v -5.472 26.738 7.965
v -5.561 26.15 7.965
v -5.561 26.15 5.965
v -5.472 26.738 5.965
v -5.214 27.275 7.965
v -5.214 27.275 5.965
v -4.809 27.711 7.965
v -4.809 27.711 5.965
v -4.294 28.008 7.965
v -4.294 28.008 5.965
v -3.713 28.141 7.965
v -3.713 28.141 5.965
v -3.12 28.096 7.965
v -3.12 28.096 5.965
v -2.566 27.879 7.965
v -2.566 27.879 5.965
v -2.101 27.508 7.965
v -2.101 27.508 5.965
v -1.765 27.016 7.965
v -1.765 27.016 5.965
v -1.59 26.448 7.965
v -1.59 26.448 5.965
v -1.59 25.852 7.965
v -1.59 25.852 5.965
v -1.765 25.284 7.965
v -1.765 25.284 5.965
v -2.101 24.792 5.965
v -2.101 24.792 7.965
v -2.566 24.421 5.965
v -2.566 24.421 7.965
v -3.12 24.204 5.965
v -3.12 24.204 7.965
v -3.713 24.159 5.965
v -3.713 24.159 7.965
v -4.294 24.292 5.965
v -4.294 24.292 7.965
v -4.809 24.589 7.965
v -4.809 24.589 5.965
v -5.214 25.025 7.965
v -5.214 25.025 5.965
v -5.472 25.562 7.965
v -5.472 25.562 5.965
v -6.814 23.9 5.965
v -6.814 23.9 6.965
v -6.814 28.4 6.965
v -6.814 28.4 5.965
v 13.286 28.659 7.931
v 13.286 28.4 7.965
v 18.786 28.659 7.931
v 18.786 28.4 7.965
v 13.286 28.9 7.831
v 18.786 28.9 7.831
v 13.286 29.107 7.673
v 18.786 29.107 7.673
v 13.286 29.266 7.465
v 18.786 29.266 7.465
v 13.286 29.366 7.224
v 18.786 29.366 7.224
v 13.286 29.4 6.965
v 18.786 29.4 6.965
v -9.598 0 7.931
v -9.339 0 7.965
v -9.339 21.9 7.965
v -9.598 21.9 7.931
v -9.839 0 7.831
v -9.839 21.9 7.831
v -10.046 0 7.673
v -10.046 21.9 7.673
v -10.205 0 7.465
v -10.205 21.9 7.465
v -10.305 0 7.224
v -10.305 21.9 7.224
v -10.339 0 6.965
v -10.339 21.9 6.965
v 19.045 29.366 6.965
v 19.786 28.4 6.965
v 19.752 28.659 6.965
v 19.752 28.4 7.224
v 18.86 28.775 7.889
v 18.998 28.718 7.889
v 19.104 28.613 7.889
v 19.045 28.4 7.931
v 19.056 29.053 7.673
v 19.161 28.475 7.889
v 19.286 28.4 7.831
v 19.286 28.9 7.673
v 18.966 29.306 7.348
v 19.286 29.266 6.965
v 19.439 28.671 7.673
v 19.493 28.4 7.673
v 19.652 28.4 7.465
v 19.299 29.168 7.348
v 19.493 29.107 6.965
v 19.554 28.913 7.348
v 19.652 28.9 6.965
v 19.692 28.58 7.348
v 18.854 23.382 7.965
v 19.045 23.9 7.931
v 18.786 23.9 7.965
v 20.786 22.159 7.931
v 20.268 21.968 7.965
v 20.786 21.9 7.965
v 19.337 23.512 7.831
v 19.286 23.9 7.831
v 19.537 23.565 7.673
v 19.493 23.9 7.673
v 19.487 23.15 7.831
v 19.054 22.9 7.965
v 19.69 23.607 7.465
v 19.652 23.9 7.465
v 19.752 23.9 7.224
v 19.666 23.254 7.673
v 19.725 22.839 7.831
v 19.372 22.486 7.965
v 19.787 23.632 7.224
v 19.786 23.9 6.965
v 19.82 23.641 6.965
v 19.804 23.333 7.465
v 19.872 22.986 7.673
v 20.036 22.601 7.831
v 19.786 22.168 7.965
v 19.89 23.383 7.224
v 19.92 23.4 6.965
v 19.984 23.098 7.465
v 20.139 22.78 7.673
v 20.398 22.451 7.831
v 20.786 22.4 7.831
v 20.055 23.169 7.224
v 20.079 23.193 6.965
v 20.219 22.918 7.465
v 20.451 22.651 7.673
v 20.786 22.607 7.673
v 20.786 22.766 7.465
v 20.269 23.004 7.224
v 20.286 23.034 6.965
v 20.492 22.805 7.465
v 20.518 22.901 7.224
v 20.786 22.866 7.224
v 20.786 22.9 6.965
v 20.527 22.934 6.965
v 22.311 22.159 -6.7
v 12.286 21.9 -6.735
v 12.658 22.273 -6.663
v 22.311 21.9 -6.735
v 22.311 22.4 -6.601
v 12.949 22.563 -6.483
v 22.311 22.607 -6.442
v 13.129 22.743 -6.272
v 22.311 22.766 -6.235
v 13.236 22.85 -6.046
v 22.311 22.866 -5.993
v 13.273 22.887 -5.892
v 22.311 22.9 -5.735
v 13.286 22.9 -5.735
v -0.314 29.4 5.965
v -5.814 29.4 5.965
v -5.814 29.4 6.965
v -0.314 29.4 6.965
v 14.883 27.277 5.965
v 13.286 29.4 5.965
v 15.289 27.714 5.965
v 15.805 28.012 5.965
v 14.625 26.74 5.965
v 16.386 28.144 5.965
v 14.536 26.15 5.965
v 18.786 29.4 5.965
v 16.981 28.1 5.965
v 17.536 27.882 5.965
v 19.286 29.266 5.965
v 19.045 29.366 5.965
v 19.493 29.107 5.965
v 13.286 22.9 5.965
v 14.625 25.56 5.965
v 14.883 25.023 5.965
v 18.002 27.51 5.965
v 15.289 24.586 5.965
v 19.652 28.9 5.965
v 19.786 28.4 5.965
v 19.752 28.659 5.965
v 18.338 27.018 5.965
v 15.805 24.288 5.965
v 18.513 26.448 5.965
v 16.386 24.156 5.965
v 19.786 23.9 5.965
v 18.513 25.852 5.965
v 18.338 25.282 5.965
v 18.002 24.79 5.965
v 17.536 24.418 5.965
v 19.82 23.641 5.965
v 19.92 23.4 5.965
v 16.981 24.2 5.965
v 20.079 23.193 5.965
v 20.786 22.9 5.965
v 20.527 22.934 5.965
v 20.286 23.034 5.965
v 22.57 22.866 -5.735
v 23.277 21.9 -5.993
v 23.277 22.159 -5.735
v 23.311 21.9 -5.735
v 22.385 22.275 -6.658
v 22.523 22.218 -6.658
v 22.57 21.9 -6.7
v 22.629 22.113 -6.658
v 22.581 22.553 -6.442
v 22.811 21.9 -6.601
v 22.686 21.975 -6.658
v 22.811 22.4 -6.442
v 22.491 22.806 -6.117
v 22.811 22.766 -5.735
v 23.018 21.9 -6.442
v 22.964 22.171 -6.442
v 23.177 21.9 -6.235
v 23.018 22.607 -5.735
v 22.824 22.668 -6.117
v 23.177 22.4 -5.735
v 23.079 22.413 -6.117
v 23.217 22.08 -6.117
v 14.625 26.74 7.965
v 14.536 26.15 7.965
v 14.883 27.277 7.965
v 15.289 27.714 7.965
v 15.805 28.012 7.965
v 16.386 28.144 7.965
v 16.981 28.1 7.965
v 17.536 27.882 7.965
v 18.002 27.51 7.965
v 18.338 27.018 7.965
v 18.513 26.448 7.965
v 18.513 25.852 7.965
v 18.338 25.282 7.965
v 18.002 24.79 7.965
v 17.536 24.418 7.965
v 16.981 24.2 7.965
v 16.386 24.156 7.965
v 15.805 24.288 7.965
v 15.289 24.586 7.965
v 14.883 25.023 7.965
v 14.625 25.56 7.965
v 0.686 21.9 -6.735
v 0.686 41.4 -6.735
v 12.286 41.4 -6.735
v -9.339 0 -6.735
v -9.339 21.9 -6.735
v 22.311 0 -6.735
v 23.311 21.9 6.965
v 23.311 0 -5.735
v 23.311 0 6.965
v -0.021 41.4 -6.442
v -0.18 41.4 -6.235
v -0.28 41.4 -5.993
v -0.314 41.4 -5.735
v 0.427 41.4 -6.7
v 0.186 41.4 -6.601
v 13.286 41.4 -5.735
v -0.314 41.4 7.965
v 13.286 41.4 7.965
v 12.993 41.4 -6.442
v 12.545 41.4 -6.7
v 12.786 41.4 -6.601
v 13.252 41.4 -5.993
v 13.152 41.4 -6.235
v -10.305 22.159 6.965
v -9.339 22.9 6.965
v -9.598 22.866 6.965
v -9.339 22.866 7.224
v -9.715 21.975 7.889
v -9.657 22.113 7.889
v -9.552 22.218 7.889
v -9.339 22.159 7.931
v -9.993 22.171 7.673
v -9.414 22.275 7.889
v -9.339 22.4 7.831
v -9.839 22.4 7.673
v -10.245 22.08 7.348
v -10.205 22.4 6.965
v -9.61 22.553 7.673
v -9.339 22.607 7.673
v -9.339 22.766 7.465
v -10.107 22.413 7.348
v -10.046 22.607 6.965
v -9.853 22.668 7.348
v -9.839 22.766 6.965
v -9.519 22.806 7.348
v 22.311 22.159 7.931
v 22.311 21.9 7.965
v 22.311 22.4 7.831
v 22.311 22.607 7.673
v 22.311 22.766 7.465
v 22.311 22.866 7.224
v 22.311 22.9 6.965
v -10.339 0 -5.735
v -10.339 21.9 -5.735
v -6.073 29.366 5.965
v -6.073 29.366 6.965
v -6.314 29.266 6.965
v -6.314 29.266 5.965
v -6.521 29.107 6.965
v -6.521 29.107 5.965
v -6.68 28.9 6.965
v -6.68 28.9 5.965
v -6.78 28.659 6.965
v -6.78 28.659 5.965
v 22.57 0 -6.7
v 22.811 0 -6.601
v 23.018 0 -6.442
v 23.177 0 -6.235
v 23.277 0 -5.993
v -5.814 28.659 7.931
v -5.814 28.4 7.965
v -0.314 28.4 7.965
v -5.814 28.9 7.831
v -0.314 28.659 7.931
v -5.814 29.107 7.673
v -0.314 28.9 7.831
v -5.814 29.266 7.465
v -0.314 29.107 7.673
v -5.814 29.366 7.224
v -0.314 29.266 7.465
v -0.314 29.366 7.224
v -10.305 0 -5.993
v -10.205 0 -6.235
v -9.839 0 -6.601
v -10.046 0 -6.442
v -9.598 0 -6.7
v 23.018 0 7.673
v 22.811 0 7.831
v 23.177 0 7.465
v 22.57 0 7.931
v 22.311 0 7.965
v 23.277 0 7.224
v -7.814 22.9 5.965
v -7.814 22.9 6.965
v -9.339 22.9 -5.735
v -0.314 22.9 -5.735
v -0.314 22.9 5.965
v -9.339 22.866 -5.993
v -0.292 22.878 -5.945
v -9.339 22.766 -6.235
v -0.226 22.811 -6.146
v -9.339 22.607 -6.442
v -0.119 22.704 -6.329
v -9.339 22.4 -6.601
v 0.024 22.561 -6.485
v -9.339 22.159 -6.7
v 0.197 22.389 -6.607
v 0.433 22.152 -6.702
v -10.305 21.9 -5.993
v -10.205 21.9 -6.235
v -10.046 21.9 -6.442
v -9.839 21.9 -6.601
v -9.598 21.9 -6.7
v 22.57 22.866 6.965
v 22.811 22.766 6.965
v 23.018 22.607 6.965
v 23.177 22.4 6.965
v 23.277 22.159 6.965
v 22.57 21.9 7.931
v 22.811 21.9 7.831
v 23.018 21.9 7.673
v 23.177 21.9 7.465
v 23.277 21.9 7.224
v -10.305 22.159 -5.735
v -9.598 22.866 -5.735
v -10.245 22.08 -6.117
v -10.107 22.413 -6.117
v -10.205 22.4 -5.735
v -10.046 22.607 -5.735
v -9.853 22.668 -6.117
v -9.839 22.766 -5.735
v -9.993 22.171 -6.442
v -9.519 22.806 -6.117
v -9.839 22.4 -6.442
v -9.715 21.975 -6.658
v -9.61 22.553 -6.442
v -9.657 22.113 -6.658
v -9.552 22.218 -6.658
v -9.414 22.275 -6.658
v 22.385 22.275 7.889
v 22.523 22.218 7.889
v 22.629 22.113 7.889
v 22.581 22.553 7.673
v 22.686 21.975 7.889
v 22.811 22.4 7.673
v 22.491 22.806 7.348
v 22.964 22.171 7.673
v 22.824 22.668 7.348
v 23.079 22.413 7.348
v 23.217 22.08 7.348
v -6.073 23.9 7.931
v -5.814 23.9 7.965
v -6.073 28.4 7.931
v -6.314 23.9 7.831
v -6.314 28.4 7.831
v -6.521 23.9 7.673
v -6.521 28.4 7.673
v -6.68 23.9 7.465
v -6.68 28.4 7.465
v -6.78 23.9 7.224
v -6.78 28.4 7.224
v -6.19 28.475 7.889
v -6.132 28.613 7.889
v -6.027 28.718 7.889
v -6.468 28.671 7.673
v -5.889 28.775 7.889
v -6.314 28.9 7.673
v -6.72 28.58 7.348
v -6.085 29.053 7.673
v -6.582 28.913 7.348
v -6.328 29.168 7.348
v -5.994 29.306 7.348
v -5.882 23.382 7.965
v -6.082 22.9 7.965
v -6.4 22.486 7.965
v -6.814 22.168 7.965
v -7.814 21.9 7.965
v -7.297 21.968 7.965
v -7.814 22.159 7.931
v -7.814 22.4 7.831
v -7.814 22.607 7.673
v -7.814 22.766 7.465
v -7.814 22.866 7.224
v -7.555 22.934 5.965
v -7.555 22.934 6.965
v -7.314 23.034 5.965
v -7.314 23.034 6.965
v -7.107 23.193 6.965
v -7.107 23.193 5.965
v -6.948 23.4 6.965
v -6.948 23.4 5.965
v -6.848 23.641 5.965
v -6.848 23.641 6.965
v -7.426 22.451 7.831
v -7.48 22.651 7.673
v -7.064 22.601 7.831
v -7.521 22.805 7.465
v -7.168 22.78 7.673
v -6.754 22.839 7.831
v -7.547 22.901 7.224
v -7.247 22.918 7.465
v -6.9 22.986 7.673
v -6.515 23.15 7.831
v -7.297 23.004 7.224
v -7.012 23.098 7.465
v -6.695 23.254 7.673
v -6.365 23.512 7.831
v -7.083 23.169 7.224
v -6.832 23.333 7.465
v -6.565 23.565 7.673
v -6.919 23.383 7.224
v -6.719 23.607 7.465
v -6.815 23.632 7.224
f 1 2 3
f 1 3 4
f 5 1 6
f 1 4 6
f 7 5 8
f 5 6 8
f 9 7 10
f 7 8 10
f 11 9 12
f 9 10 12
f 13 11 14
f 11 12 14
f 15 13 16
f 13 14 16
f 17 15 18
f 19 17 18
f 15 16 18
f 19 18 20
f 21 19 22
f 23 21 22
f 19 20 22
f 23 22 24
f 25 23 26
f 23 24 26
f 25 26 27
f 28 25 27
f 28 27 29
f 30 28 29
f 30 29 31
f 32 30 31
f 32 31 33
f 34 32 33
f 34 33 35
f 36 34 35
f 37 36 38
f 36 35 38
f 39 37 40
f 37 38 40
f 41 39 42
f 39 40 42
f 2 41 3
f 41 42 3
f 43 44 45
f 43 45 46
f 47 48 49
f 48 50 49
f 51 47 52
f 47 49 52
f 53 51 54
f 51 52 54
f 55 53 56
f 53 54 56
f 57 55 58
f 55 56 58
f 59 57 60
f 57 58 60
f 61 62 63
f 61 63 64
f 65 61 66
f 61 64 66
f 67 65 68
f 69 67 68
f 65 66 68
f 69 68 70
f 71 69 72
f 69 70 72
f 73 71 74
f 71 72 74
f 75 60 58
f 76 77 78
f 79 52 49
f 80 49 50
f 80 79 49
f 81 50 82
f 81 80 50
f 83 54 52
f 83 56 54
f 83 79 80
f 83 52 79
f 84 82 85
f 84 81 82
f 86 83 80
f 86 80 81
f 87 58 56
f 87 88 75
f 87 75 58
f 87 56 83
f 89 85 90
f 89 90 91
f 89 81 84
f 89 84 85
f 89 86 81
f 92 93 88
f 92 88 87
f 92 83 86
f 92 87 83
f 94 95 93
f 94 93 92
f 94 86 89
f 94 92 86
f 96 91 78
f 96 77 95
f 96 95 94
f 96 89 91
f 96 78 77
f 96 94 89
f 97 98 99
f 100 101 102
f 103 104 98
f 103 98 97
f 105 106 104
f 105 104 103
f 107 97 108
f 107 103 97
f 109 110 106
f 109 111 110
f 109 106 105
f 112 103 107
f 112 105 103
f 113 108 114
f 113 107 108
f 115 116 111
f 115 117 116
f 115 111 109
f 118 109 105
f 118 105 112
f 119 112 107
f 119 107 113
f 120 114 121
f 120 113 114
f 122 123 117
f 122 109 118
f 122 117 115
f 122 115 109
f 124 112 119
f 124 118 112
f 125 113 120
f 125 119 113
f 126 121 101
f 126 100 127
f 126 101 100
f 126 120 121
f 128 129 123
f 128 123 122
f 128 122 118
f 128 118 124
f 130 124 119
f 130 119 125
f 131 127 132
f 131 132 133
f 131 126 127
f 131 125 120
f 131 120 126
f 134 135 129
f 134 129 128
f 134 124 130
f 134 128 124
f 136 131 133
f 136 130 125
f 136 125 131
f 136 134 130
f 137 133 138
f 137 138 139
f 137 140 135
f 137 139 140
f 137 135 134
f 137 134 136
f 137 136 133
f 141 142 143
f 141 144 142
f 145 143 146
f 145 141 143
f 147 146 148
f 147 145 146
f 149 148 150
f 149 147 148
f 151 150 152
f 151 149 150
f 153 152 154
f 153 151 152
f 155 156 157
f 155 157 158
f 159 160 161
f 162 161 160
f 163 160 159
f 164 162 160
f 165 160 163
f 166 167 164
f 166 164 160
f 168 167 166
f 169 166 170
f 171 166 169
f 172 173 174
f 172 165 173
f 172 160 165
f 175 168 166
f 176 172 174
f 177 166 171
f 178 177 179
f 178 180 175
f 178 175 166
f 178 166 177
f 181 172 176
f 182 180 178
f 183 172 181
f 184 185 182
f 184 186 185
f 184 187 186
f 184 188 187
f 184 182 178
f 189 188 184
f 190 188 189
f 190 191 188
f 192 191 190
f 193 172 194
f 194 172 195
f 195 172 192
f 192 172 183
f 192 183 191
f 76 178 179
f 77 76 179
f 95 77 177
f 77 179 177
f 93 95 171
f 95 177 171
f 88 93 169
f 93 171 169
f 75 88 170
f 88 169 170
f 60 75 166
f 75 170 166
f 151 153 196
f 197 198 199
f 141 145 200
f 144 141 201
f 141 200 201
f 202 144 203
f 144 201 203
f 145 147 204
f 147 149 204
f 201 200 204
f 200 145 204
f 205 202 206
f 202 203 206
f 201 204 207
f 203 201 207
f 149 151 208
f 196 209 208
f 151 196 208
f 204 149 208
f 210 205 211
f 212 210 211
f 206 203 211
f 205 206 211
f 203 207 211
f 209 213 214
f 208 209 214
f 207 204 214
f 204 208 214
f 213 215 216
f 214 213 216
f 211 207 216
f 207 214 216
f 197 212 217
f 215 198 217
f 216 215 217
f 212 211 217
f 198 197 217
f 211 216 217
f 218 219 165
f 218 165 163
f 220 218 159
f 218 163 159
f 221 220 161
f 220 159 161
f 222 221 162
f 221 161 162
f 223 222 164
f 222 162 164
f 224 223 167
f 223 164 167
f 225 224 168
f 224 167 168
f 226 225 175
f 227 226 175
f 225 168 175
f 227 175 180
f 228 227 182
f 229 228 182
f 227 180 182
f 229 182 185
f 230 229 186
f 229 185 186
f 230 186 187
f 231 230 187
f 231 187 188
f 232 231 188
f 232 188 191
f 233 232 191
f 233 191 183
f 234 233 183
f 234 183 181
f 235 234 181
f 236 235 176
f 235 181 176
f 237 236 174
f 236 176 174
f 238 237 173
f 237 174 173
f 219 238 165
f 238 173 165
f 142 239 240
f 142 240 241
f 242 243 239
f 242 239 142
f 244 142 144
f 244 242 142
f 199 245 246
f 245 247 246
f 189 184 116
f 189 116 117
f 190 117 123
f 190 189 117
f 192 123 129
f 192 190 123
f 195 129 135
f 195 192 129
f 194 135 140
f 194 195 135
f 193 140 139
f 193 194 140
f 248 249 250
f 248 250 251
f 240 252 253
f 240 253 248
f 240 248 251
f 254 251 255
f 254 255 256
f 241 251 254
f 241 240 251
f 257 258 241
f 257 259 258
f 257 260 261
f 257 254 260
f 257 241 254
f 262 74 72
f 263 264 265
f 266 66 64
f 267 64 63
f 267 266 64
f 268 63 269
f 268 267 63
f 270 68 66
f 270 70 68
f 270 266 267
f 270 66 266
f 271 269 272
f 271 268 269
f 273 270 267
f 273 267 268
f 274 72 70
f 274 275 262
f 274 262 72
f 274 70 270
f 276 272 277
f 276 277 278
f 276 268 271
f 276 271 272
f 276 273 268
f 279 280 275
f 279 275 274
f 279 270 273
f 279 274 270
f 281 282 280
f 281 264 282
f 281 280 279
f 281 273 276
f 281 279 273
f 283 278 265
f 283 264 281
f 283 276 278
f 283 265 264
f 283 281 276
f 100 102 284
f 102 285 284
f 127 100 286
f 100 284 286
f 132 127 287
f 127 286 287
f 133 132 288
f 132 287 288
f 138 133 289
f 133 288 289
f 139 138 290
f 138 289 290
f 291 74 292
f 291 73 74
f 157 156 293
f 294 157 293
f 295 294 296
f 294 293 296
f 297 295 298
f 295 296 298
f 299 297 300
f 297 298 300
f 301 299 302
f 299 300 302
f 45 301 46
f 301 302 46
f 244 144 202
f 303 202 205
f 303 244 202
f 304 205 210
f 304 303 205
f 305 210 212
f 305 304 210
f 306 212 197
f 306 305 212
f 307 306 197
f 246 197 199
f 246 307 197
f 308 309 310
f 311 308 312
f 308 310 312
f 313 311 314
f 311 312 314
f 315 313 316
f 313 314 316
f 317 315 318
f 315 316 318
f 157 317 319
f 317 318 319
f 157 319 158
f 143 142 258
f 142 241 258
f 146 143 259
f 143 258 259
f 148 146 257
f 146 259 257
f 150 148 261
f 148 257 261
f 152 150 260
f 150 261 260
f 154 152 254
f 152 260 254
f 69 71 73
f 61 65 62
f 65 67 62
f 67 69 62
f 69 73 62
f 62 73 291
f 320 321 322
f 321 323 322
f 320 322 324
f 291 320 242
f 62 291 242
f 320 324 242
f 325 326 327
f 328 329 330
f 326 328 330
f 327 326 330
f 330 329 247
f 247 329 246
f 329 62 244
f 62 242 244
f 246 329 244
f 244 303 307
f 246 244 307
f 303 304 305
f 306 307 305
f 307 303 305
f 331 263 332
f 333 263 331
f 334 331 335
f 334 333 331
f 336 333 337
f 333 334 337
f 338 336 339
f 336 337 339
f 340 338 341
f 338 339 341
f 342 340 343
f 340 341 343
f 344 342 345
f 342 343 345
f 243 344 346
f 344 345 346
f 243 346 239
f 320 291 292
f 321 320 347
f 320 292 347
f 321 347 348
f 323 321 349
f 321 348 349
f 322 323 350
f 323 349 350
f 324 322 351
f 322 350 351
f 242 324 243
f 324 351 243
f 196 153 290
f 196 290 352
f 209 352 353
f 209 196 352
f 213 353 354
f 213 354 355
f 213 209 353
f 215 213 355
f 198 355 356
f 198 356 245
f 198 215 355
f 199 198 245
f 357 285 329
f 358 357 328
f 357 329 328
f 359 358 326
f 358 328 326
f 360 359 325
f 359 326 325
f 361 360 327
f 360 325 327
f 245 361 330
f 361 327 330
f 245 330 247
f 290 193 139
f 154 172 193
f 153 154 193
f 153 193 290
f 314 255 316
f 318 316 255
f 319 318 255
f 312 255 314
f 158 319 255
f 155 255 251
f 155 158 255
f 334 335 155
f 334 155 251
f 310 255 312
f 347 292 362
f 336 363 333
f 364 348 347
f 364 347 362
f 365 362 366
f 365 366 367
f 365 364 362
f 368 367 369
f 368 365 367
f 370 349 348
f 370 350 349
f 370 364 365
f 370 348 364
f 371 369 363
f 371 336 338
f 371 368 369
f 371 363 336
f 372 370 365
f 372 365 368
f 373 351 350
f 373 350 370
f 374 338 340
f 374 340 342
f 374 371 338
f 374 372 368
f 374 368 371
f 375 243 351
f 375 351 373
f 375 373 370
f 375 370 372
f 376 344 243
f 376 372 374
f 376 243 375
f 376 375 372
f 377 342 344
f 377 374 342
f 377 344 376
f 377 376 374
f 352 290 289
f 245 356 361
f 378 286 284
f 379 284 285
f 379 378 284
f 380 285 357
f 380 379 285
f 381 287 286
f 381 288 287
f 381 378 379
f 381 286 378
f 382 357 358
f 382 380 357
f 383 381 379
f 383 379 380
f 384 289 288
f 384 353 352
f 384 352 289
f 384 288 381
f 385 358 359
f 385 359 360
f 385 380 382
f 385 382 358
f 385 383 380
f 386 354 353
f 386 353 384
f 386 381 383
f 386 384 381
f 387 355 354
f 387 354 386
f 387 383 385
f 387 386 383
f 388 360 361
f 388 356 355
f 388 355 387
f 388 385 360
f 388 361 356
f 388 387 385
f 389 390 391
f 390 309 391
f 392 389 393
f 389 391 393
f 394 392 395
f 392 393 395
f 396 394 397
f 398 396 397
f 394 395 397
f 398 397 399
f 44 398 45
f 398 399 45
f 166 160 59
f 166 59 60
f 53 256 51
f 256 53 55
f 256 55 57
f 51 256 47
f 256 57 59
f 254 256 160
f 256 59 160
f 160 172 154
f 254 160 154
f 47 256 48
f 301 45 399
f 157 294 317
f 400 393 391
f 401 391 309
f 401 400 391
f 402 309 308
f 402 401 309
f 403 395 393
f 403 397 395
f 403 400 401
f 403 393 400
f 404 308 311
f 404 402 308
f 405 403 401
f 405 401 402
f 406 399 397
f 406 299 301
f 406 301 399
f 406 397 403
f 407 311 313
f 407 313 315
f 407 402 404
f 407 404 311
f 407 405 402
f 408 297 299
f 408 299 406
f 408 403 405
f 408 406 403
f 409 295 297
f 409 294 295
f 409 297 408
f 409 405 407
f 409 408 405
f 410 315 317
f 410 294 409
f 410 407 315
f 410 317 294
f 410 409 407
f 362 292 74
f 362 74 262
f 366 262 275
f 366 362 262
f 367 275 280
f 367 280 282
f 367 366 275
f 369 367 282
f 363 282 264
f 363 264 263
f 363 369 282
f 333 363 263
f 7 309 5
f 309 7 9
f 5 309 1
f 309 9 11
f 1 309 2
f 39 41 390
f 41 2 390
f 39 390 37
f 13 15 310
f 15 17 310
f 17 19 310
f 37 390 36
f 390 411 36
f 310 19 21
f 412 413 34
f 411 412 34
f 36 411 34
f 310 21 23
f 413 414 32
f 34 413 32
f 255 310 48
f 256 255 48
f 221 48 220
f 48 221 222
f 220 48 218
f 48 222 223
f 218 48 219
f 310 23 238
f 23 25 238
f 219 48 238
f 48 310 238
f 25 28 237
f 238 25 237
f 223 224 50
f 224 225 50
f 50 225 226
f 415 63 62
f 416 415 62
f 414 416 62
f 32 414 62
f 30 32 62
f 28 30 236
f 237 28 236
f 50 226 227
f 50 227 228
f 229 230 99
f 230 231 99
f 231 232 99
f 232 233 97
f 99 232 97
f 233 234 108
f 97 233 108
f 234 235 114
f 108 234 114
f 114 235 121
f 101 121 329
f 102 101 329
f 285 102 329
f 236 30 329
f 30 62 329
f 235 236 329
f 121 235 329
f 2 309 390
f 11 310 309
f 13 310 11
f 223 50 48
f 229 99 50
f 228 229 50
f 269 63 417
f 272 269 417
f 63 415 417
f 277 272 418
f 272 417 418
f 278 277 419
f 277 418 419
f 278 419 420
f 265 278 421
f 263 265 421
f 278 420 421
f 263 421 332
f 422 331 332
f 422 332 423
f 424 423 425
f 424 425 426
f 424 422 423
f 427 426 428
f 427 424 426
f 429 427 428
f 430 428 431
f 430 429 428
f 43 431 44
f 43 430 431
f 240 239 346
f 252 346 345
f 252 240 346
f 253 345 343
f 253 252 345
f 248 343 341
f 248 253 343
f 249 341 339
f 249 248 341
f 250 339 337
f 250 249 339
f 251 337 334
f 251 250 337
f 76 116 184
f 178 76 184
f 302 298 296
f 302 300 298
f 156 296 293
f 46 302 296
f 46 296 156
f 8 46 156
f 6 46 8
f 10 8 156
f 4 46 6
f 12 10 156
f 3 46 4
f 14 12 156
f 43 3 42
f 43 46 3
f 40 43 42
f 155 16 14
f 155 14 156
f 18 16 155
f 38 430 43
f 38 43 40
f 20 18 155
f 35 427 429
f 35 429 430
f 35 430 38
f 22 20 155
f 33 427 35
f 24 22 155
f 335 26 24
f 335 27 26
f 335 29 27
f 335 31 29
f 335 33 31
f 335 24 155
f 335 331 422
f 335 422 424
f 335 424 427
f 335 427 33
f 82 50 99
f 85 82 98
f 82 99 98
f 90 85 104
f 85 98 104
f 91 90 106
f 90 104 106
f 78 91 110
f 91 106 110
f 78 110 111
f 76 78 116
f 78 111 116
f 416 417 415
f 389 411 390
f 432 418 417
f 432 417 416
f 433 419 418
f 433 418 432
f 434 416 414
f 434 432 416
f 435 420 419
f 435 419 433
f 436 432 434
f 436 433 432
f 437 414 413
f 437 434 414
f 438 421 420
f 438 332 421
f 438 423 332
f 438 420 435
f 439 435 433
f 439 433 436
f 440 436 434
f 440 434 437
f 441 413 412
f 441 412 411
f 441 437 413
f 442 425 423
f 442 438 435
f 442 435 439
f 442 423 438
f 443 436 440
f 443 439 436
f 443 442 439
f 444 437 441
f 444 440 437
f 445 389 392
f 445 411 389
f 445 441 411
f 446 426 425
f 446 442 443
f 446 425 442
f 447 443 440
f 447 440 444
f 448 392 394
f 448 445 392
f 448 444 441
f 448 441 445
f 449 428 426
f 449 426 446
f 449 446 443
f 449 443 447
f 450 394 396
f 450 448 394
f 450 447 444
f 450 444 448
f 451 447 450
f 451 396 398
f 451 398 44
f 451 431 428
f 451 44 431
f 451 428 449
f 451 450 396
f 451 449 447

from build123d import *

# Parameters (mm, degrees)
SKETCH1_W           = 33.65
SKETCH1_H           = 14.7
BOSS_EXTRUDE1_DEPTH = 22.9
SKETCH2_W           = 13.6
SKETCH2_H           = 14.7
BOSS_EXTRUDE2_DEPTH = 18.5
SKETCH3_W           = 6.5
SKETCH3_H           = 2
BOSS_EXTRUDE3_DEPTH = 6.5
SKETCH4_W           = 6.5
SKETCH4_H           = 2
BOSS_EXTRUDE4_DEPTH = 6.5
SKETCH5_R           = 1.996461688
CUT_EXTRUDE1_DEPTH  = 3.75
SKETCH6_R           = 2
CUT_EXTRUDE2_DEPTH  = 3.75
FILLET2_R           = 1
FILLET3_R           = 1


with BuildPart() as part:
    # Sketch1 → Boss-Extrude1 (new body)
    with BuildSketch(Plane(origin=(0, 0, 0), x_dir=(1, 0, 0), z_dir=(0, 1, 0))):
        with Locations((6.48576555, -0.615430622)):
            Rectangle(SKETCH1_W, SKETCH1_H)
    extrude(amount=BOSS_EXTRUDE1_DEPTH)

    # Sketch2 → Boss-Extrude2 (add)
    with BuildSketch(Plane(origin=(0, 22.9, 0), x_dir=(1, 0, 0), z_dir=(0, 1, 0))):
        with Locations((6.48576555, -0.615430622)):
            Rectangle(SKETCH2_W, SKETCH2_H)
    extrude(amount=BOSS_EXTRUDE2_DEPTH)

    # Sketch3 → Boss-Extrude3 (add)
    with BuildSketch(Plane(origin=(0, 22.9, 0), x_dir=(1, 0, 0), z_dir=(0, 1, 0))):
        with Locations((-3.56423445, -6.965430622)):
            Rectangle(SKETCH3_W, SKETCH3_H)
    extrude(amount=BOSS_EXTRUDE3_DEPTH)

    # Sketch4 → Boss-Extrude4 (add)
    with BuildSketch(Plane(origin=(0, 22.9, 0), x_dir=(1, 0, 0), z_dir=(0, 1, 0))):
        with Locations((16.53576555, -6.965430622)):
            Rectangle(SKETCH4_W, SKETCH4_H)
    extrude(amount=BOSS_EXTRUDE4_DEPTH)

    # Sketch5 → Cut-Extrude1 (cut, symmetric)
    with BuildSketch(Plane(origin=(0, 0, 5.965430622), x_dir=(-1, 0, 0), z_dir=(0, 0, -1))):
        with Locations((3.56423445, 26.15)):
            Circle(SKETCH5_R)
    extrude(amount=CUT_EXTRUDE1_DEPTH, both=True, mode=Mode.SUBTRACT)

    # Sketch6 → Cut-Extrude2 (cut, symmetric)
    with BuildSketch(Plane(origin=(0, 0, 5.965430622), x_dir=(-1, 0, 0), z_dir=(0, 0, -1))):
        with Locations((-16.53576555, 26.15)):
            Circle(SKETCH6_R)
    extrude(amount=CUT_EXTRUDE2_DEPTH, both=True, mode=Mode.SUBTRACT)

    # Fillet2
    fillet2_edges = [part.edges().sort_by_distance(p)[0] for p in [
        (23.31076555, 22.9, 0.615430622),
        (-6.81423445, 22.9, 6.965430622),
        (-6.81423445, 29.4, 6.965430622),
        (19.78576555, 22.9, 6.965430622),
        (19.78576555, 29.4, 6.965430622),
        (-10.33923445, 22.9, 0.615430622),
    ]]
    fillet(fillet2_edges, radius=FILLET2_R)

    # Fillet3
    fillet3_edges = [part.edges().sort_by_distance(p)[0] for p in [
        (-4.82673445, 22.9, -6.734569378),
        (-0.31423445, 32.15, -6.734569378),
        (13.28576555, 32.15, -6.734569378),
        (16.03576555, 29.4, 7.965430622),
        (19.78576555, 26.15, 7.965430622),
        (21.54826555, 22.9, 7.965430622),
        (17.79826555, 22.9, -6.734569378),
        (-6.81423445, 26.15, 7.965430622),
        (-8.57673445, 22.9, 7.965430622),
        (-3.06423445, 29.4, 7.965430622),
        (-10.33923445, 10.95, 7.965430622),
        (23.31076555, 10.95, 7.965430622),
        (23.017872331, 22.607106781, 7.965430622),
        (-10.046341231, 22.607106781, 7.965430622),
        (-6.521341231, 29.107106781, 7.965430622),
        (19.492872331, 29.107106781, 7.965430622),
        (-10.33923445, 10.95, -6.734569378),
        (23.31076555, 10.95, -6.734569378),
        (23.017872331, 22.607106781, -6.734569378),
        (-10.046341231, 22.607106781, -6.734569378),
        (20.078658769, 23.192893219, 7.965430622),
        (-7.107127669, 23.192893219, 7.965430622),
    ]]
    fillet(fillet3_edges, radius=FILLET3_R)


solid = part.part
